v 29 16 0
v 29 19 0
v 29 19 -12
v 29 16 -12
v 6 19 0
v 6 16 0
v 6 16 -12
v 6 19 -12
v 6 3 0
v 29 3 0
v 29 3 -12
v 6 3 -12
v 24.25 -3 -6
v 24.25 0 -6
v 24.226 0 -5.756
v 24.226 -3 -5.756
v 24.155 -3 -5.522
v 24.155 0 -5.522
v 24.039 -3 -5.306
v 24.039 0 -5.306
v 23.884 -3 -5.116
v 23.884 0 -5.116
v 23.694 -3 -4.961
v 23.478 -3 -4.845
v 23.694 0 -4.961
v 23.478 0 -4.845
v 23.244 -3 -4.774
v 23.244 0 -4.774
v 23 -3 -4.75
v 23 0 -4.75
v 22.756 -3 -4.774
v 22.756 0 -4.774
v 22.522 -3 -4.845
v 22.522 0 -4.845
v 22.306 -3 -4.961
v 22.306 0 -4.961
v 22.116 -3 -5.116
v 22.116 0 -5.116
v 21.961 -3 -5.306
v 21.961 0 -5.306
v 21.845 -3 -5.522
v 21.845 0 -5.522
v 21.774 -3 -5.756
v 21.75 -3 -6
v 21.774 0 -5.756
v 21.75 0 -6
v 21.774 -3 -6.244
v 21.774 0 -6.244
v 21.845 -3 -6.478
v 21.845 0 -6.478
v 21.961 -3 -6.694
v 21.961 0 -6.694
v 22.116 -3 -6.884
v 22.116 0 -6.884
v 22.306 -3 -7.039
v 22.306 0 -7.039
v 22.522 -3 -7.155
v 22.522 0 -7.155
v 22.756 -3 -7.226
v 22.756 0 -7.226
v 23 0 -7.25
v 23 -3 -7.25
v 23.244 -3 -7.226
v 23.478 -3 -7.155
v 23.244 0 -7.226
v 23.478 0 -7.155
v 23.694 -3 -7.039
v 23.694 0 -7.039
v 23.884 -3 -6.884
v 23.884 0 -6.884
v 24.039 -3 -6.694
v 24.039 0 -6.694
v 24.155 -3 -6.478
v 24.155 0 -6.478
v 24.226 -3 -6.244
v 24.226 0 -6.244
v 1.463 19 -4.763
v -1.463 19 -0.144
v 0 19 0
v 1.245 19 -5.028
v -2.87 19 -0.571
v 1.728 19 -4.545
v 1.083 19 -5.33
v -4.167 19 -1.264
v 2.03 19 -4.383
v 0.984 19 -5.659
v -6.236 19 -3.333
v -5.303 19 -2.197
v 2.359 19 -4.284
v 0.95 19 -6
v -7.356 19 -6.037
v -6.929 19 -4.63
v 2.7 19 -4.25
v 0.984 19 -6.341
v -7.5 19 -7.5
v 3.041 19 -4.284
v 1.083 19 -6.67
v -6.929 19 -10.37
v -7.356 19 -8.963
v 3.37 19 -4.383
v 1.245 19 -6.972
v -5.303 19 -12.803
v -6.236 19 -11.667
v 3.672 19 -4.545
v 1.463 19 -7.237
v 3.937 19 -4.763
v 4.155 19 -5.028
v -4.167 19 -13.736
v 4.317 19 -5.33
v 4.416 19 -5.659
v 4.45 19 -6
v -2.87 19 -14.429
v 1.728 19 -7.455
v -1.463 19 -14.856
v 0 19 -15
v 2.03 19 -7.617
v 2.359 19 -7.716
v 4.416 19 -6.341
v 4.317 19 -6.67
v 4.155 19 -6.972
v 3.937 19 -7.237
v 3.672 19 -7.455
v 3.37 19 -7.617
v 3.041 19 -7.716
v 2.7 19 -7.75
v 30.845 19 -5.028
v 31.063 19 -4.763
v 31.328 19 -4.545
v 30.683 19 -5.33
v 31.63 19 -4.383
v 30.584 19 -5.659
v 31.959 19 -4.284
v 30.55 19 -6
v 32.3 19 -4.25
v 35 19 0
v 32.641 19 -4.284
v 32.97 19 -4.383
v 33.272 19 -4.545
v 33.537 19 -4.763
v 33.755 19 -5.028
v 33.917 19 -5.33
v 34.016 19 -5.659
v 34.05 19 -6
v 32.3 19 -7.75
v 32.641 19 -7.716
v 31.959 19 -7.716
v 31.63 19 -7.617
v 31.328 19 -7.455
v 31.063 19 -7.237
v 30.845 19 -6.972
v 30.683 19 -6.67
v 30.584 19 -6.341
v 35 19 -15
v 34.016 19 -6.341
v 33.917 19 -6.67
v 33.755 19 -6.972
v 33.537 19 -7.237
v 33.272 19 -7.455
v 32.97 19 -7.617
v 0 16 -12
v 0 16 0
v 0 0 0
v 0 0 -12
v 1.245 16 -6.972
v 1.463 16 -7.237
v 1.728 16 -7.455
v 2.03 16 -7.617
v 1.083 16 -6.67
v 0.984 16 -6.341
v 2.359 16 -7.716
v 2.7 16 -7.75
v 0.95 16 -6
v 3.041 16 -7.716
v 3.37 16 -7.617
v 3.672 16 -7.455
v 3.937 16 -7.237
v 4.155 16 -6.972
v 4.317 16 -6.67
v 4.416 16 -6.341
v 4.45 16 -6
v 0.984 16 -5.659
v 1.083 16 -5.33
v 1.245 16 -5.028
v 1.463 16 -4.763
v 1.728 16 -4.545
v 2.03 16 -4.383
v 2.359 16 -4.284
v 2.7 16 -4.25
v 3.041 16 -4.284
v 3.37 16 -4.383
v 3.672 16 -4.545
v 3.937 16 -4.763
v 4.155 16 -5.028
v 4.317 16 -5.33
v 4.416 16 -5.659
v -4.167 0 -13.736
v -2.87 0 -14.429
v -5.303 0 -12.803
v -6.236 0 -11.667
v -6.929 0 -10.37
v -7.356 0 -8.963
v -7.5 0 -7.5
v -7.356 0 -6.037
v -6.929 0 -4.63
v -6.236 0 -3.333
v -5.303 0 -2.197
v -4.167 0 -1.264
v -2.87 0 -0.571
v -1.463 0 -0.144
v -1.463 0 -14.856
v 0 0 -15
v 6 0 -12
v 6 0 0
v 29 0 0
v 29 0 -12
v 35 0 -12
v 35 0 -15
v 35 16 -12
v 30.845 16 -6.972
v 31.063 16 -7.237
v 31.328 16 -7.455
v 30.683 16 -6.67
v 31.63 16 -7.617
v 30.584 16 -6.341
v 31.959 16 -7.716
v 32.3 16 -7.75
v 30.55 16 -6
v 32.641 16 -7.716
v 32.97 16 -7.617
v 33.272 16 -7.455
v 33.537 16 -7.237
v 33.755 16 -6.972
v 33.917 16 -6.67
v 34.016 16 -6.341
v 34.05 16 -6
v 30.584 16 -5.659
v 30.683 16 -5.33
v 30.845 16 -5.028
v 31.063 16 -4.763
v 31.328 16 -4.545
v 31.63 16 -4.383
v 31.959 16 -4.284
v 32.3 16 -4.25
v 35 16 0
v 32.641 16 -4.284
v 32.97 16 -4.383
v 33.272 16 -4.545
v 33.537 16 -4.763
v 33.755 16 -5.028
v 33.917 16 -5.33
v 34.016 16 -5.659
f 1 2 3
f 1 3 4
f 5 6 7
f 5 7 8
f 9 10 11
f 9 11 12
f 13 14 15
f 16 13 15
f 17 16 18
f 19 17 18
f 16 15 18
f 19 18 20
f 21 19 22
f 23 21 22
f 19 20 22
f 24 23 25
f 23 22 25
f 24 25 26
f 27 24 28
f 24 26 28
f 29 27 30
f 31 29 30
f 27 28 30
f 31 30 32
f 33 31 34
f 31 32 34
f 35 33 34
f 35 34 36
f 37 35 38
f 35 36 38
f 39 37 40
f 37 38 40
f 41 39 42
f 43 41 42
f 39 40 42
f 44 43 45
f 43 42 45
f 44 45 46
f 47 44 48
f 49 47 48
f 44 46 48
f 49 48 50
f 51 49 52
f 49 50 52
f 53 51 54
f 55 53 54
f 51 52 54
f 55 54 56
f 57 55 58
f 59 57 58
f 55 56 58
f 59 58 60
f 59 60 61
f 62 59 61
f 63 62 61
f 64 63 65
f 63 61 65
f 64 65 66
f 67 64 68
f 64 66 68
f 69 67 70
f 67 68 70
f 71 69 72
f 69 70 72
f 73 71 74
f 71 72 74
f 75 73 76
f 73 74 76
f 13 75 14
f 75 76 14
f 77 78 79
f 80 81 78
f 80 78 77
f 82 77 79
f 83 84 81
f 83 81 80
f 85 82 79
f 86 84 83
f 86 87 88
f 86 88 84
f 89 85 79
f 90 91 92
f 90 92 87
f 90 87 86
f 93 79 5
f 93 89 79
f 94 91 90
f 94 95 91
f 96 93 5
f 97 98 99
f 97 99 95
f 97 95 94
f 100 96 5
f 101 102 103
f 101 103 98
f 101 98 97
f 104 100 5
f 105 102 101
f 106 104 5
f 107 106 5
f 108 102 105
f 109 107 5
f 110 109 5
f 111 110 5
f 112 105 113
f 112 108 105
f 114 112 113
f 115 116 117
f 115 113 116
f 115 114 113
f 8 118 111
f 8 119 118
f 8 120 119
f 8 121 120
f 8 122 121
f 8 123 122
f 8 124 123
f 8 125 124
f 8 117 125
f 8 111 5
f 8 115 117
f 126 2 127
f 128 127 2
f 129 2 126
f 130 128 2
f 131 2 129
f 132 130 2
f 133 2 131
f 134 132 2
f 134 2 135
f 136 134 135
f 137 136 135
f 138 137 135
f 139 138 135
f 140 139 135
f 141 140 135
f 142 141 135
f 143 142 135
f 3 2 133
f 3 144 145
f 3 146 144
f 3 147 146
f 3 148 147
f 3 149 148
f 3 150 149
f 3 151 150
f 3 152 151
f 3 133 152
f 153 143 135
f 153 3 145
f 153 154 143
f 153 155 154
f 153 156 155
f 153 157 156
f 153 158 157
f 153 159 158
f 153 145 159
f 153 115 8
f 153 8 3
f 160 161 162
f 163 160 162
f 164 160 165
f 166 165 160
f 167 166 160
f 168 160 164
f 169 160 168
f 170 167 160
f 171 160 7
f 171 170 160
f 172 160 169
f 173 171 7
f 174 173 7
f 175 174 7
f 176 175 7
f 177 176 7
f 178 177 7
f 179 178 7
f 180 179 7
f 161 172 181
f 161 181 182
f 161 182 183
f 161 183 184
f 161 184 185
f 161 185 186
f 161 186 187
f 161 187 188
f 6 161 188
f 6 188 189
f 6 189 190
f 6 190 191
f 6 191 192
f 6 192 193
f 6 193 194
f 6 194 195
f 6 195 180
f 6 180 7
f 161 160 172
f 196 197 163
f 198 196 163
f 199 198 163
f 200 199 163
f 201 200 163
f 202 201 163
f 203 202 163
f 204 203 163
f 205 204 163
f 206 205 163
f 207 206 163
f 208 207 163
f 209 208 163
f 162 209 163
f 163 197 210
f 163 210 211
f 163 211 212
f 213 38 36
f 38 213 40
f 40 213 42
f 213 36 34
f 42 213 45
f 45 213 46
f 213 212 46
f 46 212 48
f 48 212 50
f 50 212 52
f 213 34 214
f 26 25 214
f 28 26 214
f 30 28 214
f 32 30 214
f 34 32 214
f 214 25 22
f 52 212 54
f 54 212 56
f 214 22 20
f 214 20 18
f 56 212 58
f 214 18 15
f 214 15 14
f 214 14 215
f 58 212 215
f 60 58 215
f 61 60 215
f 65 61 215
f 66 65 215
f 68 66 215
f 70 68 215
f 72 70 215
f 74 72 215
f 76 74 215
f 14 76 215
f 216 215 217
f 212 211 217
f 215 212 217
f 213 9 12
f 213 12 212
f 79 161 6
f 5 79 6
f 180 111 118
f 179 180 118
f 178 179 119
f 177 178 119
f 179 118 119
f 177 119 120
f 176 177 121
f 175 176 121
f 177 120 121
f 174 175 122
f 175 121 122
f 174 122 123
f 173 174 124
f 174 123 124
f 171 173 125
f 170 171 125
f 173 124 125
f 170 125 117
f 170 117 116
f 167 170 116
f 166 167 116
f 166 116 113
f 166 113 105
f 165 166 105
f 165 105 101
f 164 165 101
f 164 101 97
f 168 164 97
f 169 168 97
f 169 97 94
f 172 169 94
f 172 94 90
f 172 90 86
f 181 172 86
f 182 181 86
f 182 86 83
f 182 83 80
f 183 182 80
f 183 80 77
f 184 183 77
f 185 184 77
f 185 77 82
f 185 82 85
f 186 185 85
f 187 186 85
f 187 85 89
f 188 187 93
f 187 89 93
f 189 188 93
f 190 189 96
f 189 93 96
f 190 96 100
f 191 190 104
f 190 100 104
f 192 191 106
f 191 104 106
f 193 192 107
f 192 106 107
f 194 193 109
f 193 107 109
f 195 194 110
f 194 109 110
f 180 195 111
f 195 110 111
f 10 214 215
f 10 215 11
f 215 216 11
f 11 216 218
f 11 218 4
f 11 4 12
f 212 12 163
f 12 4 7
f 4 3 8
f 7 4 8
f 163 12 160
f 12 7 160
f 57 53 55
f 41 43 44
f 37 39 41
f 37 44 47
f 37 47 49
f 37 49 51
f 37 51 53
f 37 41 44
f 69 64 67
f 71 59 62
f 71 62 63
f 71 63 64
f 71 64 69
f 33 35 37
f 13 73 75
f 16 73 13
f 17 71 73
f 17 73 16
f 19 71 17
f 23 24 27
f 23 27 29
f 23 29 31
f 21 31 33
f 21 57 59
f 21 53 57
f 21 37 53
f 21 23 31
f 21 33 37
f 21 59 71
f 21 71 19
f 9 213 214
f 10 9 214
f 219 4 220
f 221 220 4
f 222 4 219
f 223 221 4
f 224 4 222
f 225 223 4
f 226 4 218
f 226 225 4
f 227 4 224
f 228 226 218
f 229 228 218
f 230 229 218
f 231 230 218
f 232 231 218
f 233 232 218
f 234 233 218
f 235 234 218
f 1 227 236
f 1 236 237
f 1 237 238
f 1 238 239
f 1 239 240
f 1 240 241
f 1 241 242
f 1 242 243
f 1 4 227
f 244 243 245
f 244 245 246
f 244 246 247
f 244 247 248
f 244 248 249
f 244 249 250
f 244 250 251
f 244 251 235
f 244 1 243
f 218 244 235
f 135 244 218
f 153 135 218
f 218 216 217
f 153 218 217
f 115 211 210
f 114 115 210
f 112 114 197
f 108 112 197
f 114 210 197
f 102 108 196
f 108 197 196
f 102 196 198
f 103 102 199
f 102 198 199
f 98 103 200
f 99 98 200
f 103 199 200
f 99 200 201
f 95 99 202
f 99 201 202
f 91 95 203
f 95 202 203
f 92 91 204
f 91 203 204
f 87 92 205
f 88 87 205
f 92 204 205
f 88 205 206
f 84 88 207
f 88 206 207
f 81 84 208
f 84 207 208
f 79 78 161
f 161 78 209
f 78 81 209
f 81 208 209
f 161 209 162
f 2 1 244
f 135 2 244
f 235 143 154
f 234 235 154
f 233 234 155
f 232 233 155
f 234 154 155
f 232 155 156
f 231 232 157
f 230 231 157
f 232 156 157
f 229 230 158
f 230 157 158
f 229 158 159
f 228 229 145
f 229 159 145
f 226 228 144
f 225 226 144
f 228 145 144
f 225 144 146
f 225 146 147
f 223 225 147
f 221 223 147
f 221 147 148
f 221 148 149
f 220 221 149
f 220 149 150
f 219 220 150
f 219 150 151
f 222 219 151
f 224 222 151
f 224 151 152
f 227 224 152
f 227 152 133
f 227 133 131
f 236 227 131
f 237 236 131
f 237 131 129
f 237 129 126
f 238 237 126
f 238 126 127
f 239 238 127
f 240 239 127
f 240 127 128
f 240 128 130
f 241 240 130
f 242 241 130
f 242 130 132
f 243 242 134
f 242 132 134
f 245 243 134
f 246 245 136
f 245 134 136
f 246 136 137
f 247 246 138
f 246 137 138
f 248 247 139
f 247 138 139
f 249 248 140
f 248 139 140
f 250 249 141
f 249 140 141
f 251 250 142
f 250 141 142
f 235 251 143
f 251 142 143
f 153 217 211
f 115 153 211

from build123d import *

# Parameters (mm, degrees)
BOSS_EXTRU_1_DEPTH      = 19
ENL_V_MAT_EXTRU_2_DEPTH = 12
ESQUISSE4_R             = 1.75
ENL_V_MAT_EXTRU_3_DEPTH = 12
ESQUISSE5_R             = 1.25
BOSS_EXTRU_2_DEPTH      = 3


with BuildPart() as part:
    # Esquisse1 → Boss.-Extru.1 (new body)
    with BuildSketch(Plane(origin=(0, 0, 0), x_dir=(1, 0, 0), z_dir=(0, 1, 0))):
        with BuildLine():
            Line((0, 0), (35, 0))
            Line((35, 0), (35, 15))
            Line((35, 15), (0, 15))
            ThreePointArc((0, 15), (-7.5, 7.5), (0, 0))
        make_face()
    extrude(amount=BOSS_EXTRU_1_DEPTH)

    # Esquisse3 → Enlèv. mat.-Extru.2 (cut)
    with BuildSketch(Plane.XY):
        Polygon((6, 19), (29, 19), (29, 16), (35, 16), (35, 3.144779012), (35, 0), (29, 0), (29, 3), (6, 3), (6, 0), (0, 0), (0, 3.824764885), (0, 16), (6, 16), align=None)
    extrude(amount=-ENL_V_MAT_EXTRU_2_DEPTH, mode=Mode.SUBTRACT)

    # Esquisse4 → Enlèv. mat.-Extru.3 (cut)
    with BuildSketch(Plane(origin=(0, 19, 0), x_dir=(1, 0, 0), z_dir=(0, 1, 0))):
        with Locations((32.3, 6)):
            Circle(ESQUISSE4_R)
        with Locations((2.7, 6)):
            Circle(ESQUISSE4_R)
    extrude(amount=-ENL_V_MAT_EXTRU_3_DEPTH, mode=Mode.SUBTRACT)

    # Esquisse5 → Boss.-Extru.2 (add)
    with BuildSketch(Plane.XZ):
        with Locations((23, -6)):
            Circle(ESQUISSE5_R)
    extrude(amount=BOSS_EXTRU_2_DEPTH)


solid = part.part
